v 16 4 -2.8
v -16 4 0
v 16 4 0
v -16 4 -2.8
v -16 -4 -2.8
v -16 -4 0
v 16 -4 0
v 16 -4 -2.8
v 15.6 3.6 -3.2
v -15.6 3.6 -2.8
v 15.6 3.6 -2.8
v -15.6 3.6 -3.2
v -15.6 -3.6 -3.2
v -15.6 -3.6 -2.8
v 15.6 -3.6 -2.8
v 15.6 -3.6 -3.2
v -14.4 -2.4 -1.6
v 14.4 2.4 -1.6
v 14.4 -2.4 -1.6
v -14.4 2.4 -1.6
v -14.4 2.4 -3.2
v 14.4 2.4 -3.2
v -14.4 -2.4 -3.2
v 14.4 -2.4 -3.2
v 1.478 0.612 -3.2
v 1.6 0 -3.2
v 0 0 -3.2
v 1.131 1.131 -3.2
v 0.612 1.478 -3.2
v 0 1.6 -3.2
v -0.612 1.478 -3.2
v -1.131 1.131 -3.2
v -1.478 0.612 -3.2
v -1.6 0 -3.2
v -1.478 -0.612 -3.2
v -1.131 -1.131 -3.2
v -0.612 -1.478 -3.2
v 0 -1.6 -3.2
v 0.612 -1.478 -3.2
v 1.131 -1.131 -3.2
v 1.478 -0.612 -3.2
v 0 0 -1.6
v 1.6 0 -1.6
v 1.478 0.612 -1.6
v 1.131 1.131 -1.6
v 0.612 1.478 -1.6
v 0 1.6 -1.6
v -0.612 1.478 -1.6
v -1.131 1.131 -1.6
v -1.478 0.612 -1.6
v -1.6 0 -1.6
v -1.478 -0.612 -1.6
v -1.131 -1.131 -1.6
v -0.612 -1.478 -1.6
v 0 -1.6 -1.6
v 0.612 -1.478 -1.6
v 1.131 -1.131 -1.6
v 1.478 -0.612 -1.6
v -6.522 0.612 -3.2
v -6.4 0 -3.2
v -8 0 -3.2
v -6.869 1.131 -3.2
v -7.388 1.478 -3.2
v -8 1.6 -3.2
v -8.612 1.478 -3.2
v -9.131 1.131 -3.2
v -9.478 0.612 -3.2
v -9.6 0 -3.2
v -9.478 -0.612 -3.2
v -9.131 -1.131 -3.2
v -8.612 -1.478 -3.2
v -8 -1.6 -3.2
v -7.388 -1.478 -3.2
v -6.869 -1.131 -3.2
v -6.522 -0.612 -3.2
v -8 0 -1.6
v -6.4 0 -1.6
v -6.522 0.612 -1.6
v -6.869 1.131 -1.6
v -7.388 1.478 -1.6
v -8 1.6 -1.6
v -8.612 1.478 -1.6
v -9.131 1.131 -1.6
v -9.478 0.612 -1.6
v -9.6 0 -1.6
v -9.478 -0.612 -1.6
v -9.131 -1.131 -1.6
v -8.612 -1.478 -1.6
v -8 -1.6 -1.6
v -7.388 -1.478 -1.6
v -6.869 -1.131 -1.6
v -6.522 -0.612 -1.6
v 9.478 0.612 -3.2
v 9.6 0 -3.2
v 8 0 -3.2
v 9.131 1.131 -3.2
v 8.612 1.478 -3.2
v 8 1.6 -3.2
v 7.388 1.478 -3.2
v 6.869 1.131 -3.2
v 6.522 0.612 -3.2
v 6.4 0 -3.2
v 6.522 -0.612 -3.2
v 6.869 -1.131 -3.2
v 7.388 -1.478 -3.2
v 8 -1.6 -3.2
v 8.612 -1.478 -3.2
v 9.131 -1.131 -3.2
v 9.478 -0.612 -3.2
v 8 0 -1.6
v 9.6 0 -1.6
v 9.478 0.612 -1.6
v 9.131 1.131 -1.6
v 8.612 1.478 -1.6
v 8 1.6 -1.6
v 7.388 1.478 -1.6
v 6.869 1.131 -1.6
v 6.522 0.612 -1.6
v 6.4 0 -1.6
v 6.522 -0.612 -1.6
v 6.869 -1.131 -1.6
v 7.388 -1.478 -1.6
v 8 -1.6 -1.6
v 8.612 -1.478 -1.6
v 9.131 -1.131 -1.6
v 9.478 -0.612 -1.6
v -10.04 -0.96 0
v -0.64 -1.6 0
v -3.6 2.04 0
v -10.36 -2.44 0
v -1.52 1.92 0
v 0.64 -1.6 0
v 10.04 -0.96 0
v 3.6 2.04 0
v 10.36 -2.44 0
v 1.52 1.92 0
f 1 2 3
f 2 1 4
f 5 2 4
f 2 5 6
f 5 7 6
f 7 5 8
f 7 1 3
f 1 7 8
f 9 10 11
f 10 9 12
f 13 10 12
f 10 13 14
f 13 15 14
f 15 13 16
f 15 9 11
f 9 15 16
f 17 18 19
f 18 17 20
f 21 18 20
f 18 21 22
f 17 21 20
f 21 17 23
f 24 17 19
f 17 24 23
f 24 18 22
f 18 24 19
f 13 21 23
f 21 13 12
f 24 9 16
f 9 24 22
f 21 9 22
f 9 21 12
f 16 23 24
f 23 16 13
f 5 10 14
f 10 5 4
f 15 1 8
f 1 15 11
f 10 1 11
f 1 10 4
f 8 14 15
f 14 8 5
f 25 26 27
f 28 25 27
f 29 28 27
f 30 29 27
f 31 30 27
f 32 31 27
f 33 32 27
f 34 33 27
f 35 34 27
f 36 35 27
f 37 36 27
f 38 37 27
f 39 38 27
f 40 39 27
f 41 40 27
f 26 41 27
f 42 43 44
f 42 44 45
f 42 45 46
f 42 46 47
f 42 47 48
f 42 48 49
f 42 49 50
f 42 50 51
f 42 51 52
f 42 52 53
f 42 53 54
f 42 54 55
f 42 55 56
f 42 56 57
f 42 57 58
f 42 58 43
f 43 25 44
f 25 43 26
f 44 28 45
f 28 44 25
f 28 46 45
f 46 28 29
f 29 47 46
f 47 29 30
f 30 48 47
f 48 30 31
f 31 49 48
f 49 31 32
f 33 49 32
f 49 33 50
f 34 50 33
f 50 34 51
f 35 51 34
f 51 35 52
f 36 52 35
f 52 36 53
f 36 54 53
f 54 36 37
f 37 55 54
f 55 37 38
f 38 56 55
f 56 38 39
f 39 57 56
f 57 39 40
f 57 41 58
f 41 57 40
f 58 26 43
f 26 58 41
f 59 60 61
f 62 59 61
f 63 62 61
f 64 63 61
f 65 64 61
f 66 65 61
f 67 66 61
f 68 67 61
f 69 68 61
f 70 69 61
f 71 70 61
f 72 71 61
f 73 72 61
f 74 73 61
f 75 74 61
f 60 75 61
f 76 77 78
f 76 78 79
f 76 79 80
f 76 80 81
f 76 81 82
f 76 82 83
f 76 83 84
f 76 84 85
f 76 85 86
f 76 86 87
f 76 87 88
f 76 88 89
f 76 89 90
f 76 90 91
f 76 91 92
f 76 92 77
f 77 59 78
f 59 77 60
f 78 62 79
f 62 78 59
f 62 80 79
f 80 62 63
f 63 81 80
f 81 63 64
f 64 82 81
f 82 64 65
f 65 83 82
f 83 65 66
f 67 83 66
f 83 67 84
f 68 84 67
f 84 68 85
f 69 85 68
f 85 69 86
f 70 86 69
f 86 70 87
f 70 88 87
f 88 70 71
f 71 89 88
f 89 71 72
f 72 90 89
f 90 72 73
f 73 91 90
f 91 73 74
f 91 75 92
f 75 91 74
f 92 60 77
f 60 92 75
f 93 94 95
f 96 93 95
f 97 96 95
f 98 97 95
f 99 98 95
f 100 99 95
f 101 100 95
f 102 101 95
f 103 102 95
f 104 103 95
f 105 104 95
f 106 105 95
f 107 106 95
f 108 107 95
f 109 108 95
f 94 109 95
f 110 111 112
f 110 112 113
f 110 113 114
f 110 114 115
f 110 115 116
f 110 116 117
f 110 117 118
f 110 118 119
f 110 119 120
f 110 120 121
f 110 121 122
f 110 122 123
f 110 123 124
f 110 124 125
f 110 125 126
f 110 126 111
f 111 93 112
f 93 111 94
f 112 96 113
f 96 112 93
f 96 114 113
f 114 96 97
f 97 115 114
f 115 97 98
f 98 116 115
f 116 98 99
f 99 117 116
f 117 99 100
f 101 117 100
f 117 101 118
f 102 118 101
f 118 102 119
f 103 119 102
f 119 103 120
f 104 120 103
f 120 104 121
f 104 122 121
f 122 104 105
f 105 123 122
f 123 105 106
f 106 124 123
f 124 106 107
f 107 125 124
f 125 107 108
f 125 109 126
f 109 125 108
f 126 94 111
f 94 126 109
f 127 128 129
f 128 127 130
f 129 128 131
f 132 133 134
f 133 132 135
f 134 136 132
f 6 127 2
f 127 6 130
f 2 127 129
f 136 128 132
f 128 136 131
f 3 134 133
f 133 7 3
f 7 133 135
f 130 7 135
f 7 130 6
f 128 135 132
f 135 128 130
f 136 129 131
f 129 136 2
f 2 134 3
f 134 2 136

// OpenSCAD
// file: ../p/4-4edge.scad
use <../lib.scad>
function ldraw_lib__4_4edge() = [
// 0 Circle 1.0
// 0 Name: 4-4edge.dat
// 0 Author: James Jessiman
// 0 !LDRAW_ORG Primitive UPDATE 2017-01
// 0 !LICENSE Licensed under CC BY 2.0 and CC BY 4.0 : see CAreadme.txt
// 
// 0 BFC CERTIFY CCW
  [0,"BFC","CERTIFY"],
  [0,"BFC","CCW"],
// 
// 0 !HISTORY 1998-12-15 [PTadmin] Official Update 1998-10
// 0 !HISTORY 2005-12-28 [PTadmin] Official Update 2005-01
// 0 !HISTORY 2007-06-24 [PTadmin] Header formatted for Contributor Agreement
// 0 !HISTORY 2008-07-01 [PTadmin] Official Update 2008-01
// 0 !HISTORY 2017-01-15 [Steffen] BFCed
// 0 !HISTORY 2017-12-30 [PTadmin] Official Update 2017-01
// 
// 
// 2 24 1 0 0 0.9239 0 0.3827
  [2,24,1,0,0,0.9239,0,0.3827],
// 2 24 0.9239 0 0.3827 0.7071 0 0.7071
  [2,24,0.9239,0,0.3827,0.7071,0,0.7071],
// 2 24 0.7071 0 0.7071 0.3827 0 0.9239
  [2,24,0.7071,0,0.7071,0.3827,0,0.9239],
// 2 24 0.3827 0 0.9239 0 0 1
  [2,24,0.3827,0,0.9239,0,0,1],
// 2 24 0 0 1 -0.3827 0 0.9239
  [2,24,0,0,1,-0.3827,0,0.9239],
// 2 24 -0.3827 0 0.9239 -0.7071 0 0.7071
  [2,24,-0.3827,0,0.9239,-0.7071,0,0.7071],
// 2 24 -0.7071 0 0.7071 -0.9239 0 0.3827
  [2,24,-0.7071,0,0.7071,-0.9239,0,0.3827],
// 2 24 -0.9239 0 0.3827 -1 0 -0
  [2,24,-0.9239,0,0.3827,-1,0,-0],
// 2 24 -1 0 -0 -0.9239 0 -0.3827
  [2,24,-1,0,-0,-0.9239,0,-0.3827],
// 2 24 -0.9239 0 -0.3827 -0.7071 0 -0.7071
  [2,24,-0.9239,0,-0.3827,-0.7071,0,-0.7071],
// 2 24 -0.7071 0 -0.7071 -0.3827 0 -0.9239
  [2,24,-0.7071,0,-0.7071,-0.3827,0,-0.9239],
// 2 24 -0.3827 0 -0.9239 0 0 -1
  [2,24,-0.3827,0,-0.9239,0,0,-1],
// 2 24 0 0 -1 0.3827 0 -0.9239
  [2,24,0,0,-1,0.3827,0,-0.9239],
// 2 24 0.3827 0 -0.9239 0.7071 0 -0.7071
  [2,24,0.3827,0,-0.9239,0.7071,0,-0.7071],
// 2 24 0.7071 0 -0.7071 0.9239 0 -0.3827
  [2,24,0.7071,0,-0.7071,0.9239,0,-0.3827],
// 2 24 0.9239 0 -0.3827 1 0 0
  [2,24,0.9239,0,-0.3827,1,0,0],
];
module ldraw_lib__4_4edge(step=0, col=false, unit=2/5, alt=false, line=0.2, solid=!$preview)
    makepoly(ldraw_lib__4_4edge(), step=step, col=col, unit=unit, alt=alt, line=line, solid=solid);
ldraw_lib__4_4edge(line=0.2);
// file: ../p/4-4disc.scad
use <../lib.scad>
function ldraw_lib__4_4disc() = [
// 0 Disc 1.0
// 0 Name: 4-4disc.dat
// 0 Author: James Jessiman
// 0 !LDRAW_ORG Primitive UPDATE 2002-02
// 0 !LICENSE Licensed under CC BY 2.0 and CC BY 4.0 : see CAreadme.txt
// 
// 0 BFC CERTIFY CCW
  [0,"BFC","CERTIFY"],
  [0,"BFC","CCW"],
// 
// 0 !HISTORY 1998-12-15 [PTadmin] Official Update 1998-10
// 0 !HISTORY 2002-03-23 [sbliss] Added BFC statement
// 0 !HISTORY 2002-04-25 [PTadmin] Official Update 2002-02
// 0 !HISTORY 2007-06-24 [PTadmin] Header formatted for Contributor Agreement
// 0 !HISTORY 2008-07-01 [PTadmin] Official Update 2008-01
// 
// 
// 3 16 0 0 0 1 0 0 0.9239 0 0.3827
  [3,16,0,0,0,1,0,0,0.9239,0,0.3827],
// 3 16 0 0 0 0.9239 0 0.3827 0.7071 0 0.7071
  [3,16,0,0,0,0.9239,0,0.3827,0.7071,0,0.7071],
// 3 16 0 0 0 0.7071 0 0.7071 0.3827 0 0.9239
  [3,16,0,0,0,0.7071,0,0.7071,0.3827,0,0.9239],
// 3 16 0 0 0 0.3827 0 0.9239 0 0 1
  [3,16,0,0,0,0.3827,0,0.9239,0,0,1],
// 3 16 0 0 0 0 0 1 -0.3827 0 0.9239
  [3,16,0,0,0,0,0,1,-0.3827,0,0.9239],
// 3 16 0 0 0 -0.3827 0 0.9239 -0.7071 0 0.7071
  [3,16,0,0,0,-0.3827,0,0.9239,-0.7071,0,0.7071],
// 3 16 0 0 0 -0.7071 0 0.7071 -0.9239 0 0.3827
  [3,16,0,0,0,-0.7071,0,0.7071,-0.9239,0,0.3827],
// 3 16 0 0 0 -0.9239 0 0.3827 -1 0 -0
  [3,16,0,0,0,-0.9239,0,0.3827,-1,0,-0],
// 3 16 0 0 0 -1 0 -0 -0.9239 0 -0.3827
  [3,16,0,0,0,-1,0,-0,-0.9239,0,-0.3827],
// 3 16 0 0 0 -0.9239 0 -0.3827 -0.7071 0 -0.7071
  [3,16,0,0,0,-0.9239,0,-0.3827,-0.7071,0,-0.7071],
// 3 16 0 0 0 -0.7071 0 -0.7071 -0.3827 0 -0.9239
  [3,16,0,0,0,-0.7071,0,-0.7071,-0.3827,0,-0.9239],
// 3 16 0 0 0 -0.3827 0 -0.9239 0 0 -1
  [3,16,0,0,0,-0.3827,0,-0.9239,0,0,-1],
// 3 16 0 0 0 0 0 -1 0.3827 0 -0.9239
  [3,16,0,0,0,0,0,-1,0.3827,0,-0.9239],
// 3 16 0 0 0 0.3827 0 -0.9239 0.7071 0 -0.7071
  [3,16,0,0,0,0.3827,0,-0.9239,0.7071,0,-0.7071],
// 3 16 0 0 0 0.7071 0 -0.7071 0.9239 0 -0.3827
  [3,16,0,0,0,0.7071,0,-0.7071,0.9239,0,-0.3827],
// 3 16 0 0 0 0.9239 0 -0.3827 1 0 0
  [3,16,0,0,0,0.9239,0,-0.3827,1,0,0],
// 0
];
module ldraw_lib__4_4disc(step=0, col=false, unit=2/5, alt=false, line=0.2, solid=!$preview)
    makepoly(ldraw_lib__4_4disc(), step=step, col=col, unit=unit, alt=alt, line=line, solid=solid);
ldraw_lib__4_4disc(line=0.2);
// file: ../p/4-4cyli.scad
use <../lib.scad>
$fa=1; $fs=0.2;
function ldraw_lib__4_4cyli(realsolid=false) = [
// 0 Cylinder 1.0
// 0 Name: 4-4cyli.dat
// 0 Author: James Jessiman
// 0 !LDRAW_ORG Primitive UPDATE 2005-01
// 0 !LICENSE Licensed under CC BY 2.0 and CC BY 4.0 : see CAreadme.txt
// 
// 0 BFC CERTIFY CCW
  [0,"BFC","CERTIFY"],
  [0,"BFC","CCW"],
// 
// 0 !HISTORY 1998-12-15 [PTadmin] Official Update 1998-10
// 0 !HISTORY 2002-03-23 [sbliss] Added BFC statement; merged headers from files in distributions LDraw 0.27 and Complete.
// 0 !HISTORY 2002-04-25 [PTadmin] Official Update 2002-02
// 0 !HISTORY 2004-12-14 [guyvivan] BFC CCW
// 0 !HISTORY 2005-12-28 [PTadmin] Official Update 2005-01
// 0 !HISTORY 2007-06-24 [PTadmin] Header formatted for Contributor Agreement
// 0 !HISTORY 2008-07-01 [PTadmin] Official Update 2008-01
// 
// 
// 4 16 1 1 0 0.9239 1 0.3827 0.9239 0 0.3827 1 0 0
  [4,16,1,1,0,0.9239,1,0.3827,0.9239,0,0.3827,1,0,0],
// 5 24 1 0 0 1 1 0 0.9239 0 0.3827 0.9239 0 -0.3827
  [5,24,1,0,0,1,1,0,0.9239,0,0.3827,0.9239,0,-0.3827],
// 4 16 0.9239 1 0.3827 0.7071 1 0.7071 0.7071 0 0.7071 0.9239 0 0.3827
  [4,16,0.9239,1,0.3827,0.7071,1,0.7071,0.7071,0,0.7071,0.9239,0,0.3827],
// 5 24 0.9239 0 0.3827 0.9239 1 0.3827 0.7071 0 0.7071 1 0 0
  [5,24,0.9239,0,0.3827,0.9239,1,0.3827,0.7071,0,0.7071,1,0,0],
// 4 16 0.7071 1 0.7071 0.3827 1 0.9239 0.3827 0 0.9239 0.7071 0 0.7071
  [4,16,0.7071,1,0.7071,0.3827,1,0.9239,0.3827,0,0.9239,0.7071,0,0.7071],
// 5 24 0.7071 0 0.7071 0.7071 1 0.7071 0.3827 0 0.9239 0.9239 0 0.3827
  [5,24,0.7071,0,0.7071,0.7071,1,0.7071,0.3827,0,0.9239,0.9239,0,0.3827],
// 4 16 0.3827 1 0.9239 0 1 1 0 0 1 0.3827 0 0.9239
  [4,16,0.3827,1,0.9239,0,1,1,0,0,1,0.3827,0,0.9239],
// 5 24 0.3827 0 0.9239 0.3827 1 0.9239 0 0 1 0.7071 0 0.7071
  [5,24,0.3827,0,0.9239,0.3827,1,0.9239,0,0,1,0.7071,0,0.7071],
// 4 16 0 1 1 -0.3827 1 0.9239 -0.3827 0 0.9239 0 0 1
  [4,16,0,1,1,-0.3827,1,0.9239,-0.3827,0,0.9239,0,0,1],
// 5 24 0 0 1 0 1 1 -0.3827 0 0.9239 0.3827 0 0.9239
  [5,24,0,0,1,0,1,1,-0.3827,0,0.9239,0.3827,0,0.9239],
// 4 16 -0.3827 1 0.9239 -0.7071 1 0.7071 -0.7071 0 0.7071 -0.3827 0 0.9239
  [4,16,-0.3827,1,0.9239,-0.7071,1,0.7071,-0.7071,0,0.7071,-0.3827,0,0.9239],
// 5 24 -0.3827 0 0.9239 -0.3827 1 0.9239 -0.7071 0 0.7071 0 0 1
  [5,24,-0.3827,0,0.9239,-0.3827,1,0.9239,-0.7071,0,0.7071,0,0,1],
// 4 16 -0.7071 1 0.7071 -0.9239 1 0.3827 -0.9239 0 0.3827 -0.7071 0 0.7071
  [4,16,-0.7071,1,0.7071,-0.9239,1,0.3827,-0.9239,0,0.3827,-0.7071,0,0.7071],
// 5 24 -0.7071 0 0.7071 -0.7071 1 0.7071 -0.9239 0 0.3827 -0.3827 0 0.9239
  [5,24,-0.7071,0,0.7071,-0.7071,1,0.7071,-0.9239,0,0.3827,-0.3827,0,0.9239],
// 4 16 -0.9239 1 0.3827 -1 1 0 -1 0 0 -0.9239 0 0.3827
  [4,16,-0.9239,1,0.3827,-1,1,0,-1,0,0,-0.9239,0,0.3827],
// 5 24 -0.9239 0 0.3827 -0.9239 1 0.3827 -1 0 0 -0.7071 0 0.7071
  [5,24,-0.9239,0,0.3827,-0.9239,1,0.3827,-1,0,0,-0.7071,0,0.7071],
// 4 16 -1 1 0 -0.9239 1 -0.3827 -0.9239 0 -0.3827 -1 0 0
  [4,16,-1,1,0,-0.9239,1,-0.3827,-0.9239,0,-0.3827,-1,0,0],
// 5 24 -1 0 0 -1 1 0 -0.9239 0 -0.3827 -0.9239 0 0.3827
  [5,24,-1,0,0,-1,1,0,-0.9239,0,-0.3827,-0.9239,0,0.3827],
// 4 16 -0.9239 1 -0.3827 -0.7071 1 -0.7071 -0.7071 0 -0.7071 -0.9239 0 -0.3827
  [4,16,-0.9239,1,-0.3827,-0.7071,1,-0.7071,-0.7071,0,-0.7071,-0.9239,0,-0.3827],
// 5 24 -0.9239 0 -0.3827 -0.9239 1 -0.3827 -0.7071 0 -0.7071 -1 0 0
  [5,24,-0.9239,0,-0.3827,-0.9239,1,-0.3827,-0.7071,0,-0.7071,-1,0,0],
// 4 16 -0.7071 1 -0.7071 -0.3827 1 -0.9239 -0.3827 0 -0.9239 -0.7071 0 -0.7071
  [4,16,-0.7071,1,-0.7071,-0.3827,1,-0.9239,-0.3827,0,-0.9239,-0.7071,0,-0.7071],
// 5 24 -0.7071 0 -0.7071 -0.7071 1 -0.7071 -0.3827 0 -0.9239 -0.9239 0 -0.3827
  [5,24,-0.7071,0,-0.7071,-0.7071,1,-0.7071,-0.3827,0,-0.9239,-0.9239,0,-0.3827],
// 4 16 -0.3827 1 -0.9239 0 1 -1 0 0 -1 -0.3827 0 -0.9239
  [4,16,-0.3827,1,-0.9239,0,1,-1,0,0,-1,-0.3827,0,-0.9239],
// 5 24 -0.3827 0 -0.9239 -0.3827 1 -0.9239 0 0 -1 -0.7071 0 -0.7071
  [5,24,-0.3827,0,-0.9239,-0.3827,1,-0.9239,0,0,-1,-0.7071,0,-0.7071],
// 4 16 0 1 -1 0.3827 1 -0.9239 0.3827 0 -0.9239 0 0 -1
  [4,16,0,1,-1,0.3827,1,-0.9239,0.3827,0,-0.9239,0,0,-1],
// 5 24 0 0 -1 0 1 -1 0.3827 0 -0.9239 -0.3827 0 -0.9239
  [5,24,0,0,-1,0,1,-1,0.3827,0,-0.9239,-0.3827,0,-0.9239],
// 4 16 0.3827 1 -0.9239 0.7071 1 -0.7071 0.7071 0 -0.7071 0.3827 0 -0.9239
  [4,16,0.3827,1,-0.9239,0.7071,1,-0.7071,0.7071,0,-0.7071,0.3827,0,-0.9239],
// 5 24 0.3827 0 -0.9239 0.3827 1 -0.9239 0.7071 0 -0.7071 0 0 -1
  [5,24,0.3827,0,-0.9239,0.3827,1,-0.9239,0.7071,0,-0.7071,0,0,-1],
// 4 16 0.7071 1 -0.7071 0.9239 1 -0.3827 0.9239 0 -0.3827 0.7071 0 -0.7071
  [4,16,0.7071,1,-0.7071,0.9239,1,-0.3827,0.9239,0,-0.3827,0.7071,0,-0.7071],
// 5 24 0.7071 0 -0.7071 0.7071 1 -0.7071 0.9239 0 -0.3827 0.3827 0 -0.9239
  [5,24,0.7071,0,-0.7071,0.7071,1,-0.7071,0.9239,0,-0.3827,0.3827,0,-0.9239],
// 4 16 0.9239 1 -0.3827 1 1 0 1 0 0 0.9239 0 -0.3827
  [4,16,0.9239,1,-0.3827,1,1,0,1,0,0,0.9239,0,-0.3827],
// 5 24 0.9239 0 -0.3827 0.9239 1 -0.3827 1 0 0 0.7071 0 -0.7071
  [5,24,0.9239,0,-0.3827,0.9239,1,-0.3827,1,0,0,0.7071,0,-0.7071],
// 0
];
module ldraw_lib__4_4cyli(step=0, col=false, unit=2/5, alt=false, line=0.2, solid=!$preview)
    makepoly(ldraw_lib__4_4cyli(solid), step=step, col=col, unit=unit, alt=alt, line=line, solid=solid);
ldraw_lib__4_4cyli(line=0.2);
// file: ../p/stud3.scad
use <../lib.scad>
use <4-4cyli.scad>
use <4-4disc.scad>
use <4-4edge.scad>
function ldraw_lib__stud3() = [
// 0 Stud Tube Solid
// 0 Name: stud3.dat
// 0 Author: James Jessiman
// 0 !LDRAW_ORG Primitive UPDATE 2012-01
// 0 !LICENSE Licensed under CC BY 4.0 : see CAreadme.txt
// 
// 0 BFC CERTIFY CCW
  [0,"BFC","CERTIFY"],
  [0,"BFC","CCW"],
// 
// 0 !HISTORY 2002-04-04 [sbliss] Modified for BFC compliance
// 0 !HISTORY 2002-04-25 [PTadmin] Official Update 2002-02
// 0 !HISTORY 2007-06-24 [PTadmin] Header formatted for Contributor Agreement
// 0 !HISTORY 2008-07-01 [PTadmin] Official Update 2008-01
// 0 !HISTORY 2012-02-16 [Philo] Changed to CCW
// 0 !HISTORY 2012-03-30 [PTadmin] Official Update 2012-01
// 
// 
// 1 16 0 -4 0 4 0 0 0 1 0 0 0 4 4-4edge.dat
  [1,16,0,-4,0,4,0,0,0,1,0,0,0,4, ldraw_lib__4_4edge()],
// 1 16 0 0 0 4 0 0 0 1 0 0 0 4 4-4edge.dat
  [1,16,0,0,0,4,0,0,0,1,0,0,0,4, ldraw_lib__4_4edge()],
// 1 16 0 -4 0 4 0 0 0 1 0 0 0 4 4-4disc.dat
  [1,16,0,-4,0,4,0,0,0,1,0,0,0,4, ldraw_lib__4_4disc()],
  [-1,16,0,0,0,4,0,0,0,-1,0,0,0,4, ldraw_lib__4_4disc()],
// 1 16 0 -4 0 4 0 0 0 4 0 0 0 4 4-4cyli.dat
  [1,16,0,-4,0,4,0,0,0,4,0,0,0,4, ldraw_lib__4_4cyli()],
];
module ldraw_lib__stud3(step=0, col=false, unit=2/5, alt=false, line=0.2, solid=!$preview)
    makepoly(ldraw_lib__stud3(), step=step, col=col, unit=unit, alt=alt, line=line, solid=solid);
ldraw_lib__stud3(line=0.2);
// file: ../p/box5.scad
use <../lib.scad>
function ldraw_lib__box5() = [
// 0 Box with 5 Faces and All Edges
// 0 Name: box5.dat
// 0 Author: James Jessiman
// 0 !LDRAW_ORG Primitive UPDATE 2012-01
// 0 !LICENSE Licensed under CC BY 2.0 and CC BY 4.0 : see CAreadme.txt
// 
// 0 BFC CERTIFY CCW
  [0,"BFC","CERTIFY"],
  [0,"BFC","CCW"],
// 
// 0 !HISTORY 2002-04-03 [sbliss] Modified for BFC compliance
// 0 !HISTORY 2002-04-25 [PTadmin] Official Update 2002-02
// 0 !HISTORY 2007-06-24 [PTadmin] Header formatted for Contributor Agreement
// 0 !HISTORY 2008-07-01 [PTadmin] Official Update 2008-01
// 0 !HISTORY 2012-02-16 [Philo] Changed to CCW
// 0 !HISTORY 2012-03-30 [PTadmin] Official Update 2012-01
// 
// 
// 2 24 1 1 1 -1 1 1
  [2,24,1,1,1,-1,1,1],
// 2 24 -1 1 1 -1 1 -1
  [2,24,-1,1,1,-1,1,-1],
// 2 24 -1 1 -1 1 1 -1
  [2,24,-1,1,-1,1,1,-1],
// 2 24 1 1 -1 1 1 1
  [2,24,1,1,-1,1,1,1],
// 2 24 1 0 1 -1 0 1
  [2,24,1,0,1,-1,0,1],
// 2 24 -1 0 1 -1 0 -1
  [2,24,-1,0,1,-1,0,-1],
// 2 24 -1 0 -1 1 0 -1
  [2,24,-1,0,-1,1,0,-1],
// 2 24 1 0 -1 1 0 1
  [2,24,1,0,-1,1,0,1],
// 2 24 1 0 1 1 1 1
  [2,24,1,0,1,1,1,1],
// 2 24 -1 0 1 -1 1 1
  [2,24,-1,0,1,-1,1,1],
// 2 24 1 0 -1 1 1 -1
  [2,24,1,0,-1,1,1,-1],
// 2 24 -1 0 -1 -1 1 -1
  [2,24,-1,0,-1,-1,1,-1],
// 4 16 -1 1 1 1 1 1 1 1 -1 -1 1 -1
  [4,16,-1,1,1,1,1,1,1,1,-1,-1,1,-1],
// 4 16 -1 1 1 -1 0 1 1 0 1 1 1 1
  [4,16,-1,1,1,-1,0,1,1,0,1,1,1,1],
// 4 16 -1 1 -1 -1 0 -1 -1 0 1 -1 1 1
  [4,16,-1,1,-1,-1,0,-1,-1,0,1,-1,1,1],
// 4 16 1 1 -1 1 0 -1 -1 0 -1 -1 1 -1
  [4,16,1,1,-1,1,0,-1,-1,0,-1,-1,1,-1],
// 4 16 1 1 1 1 0 1 1 0 -1 1 1 -1
  [4,16,1,1,1,1,0,1,1,0,-1,1,1,-1],
];
makepoly(ldraw_lib__box5(), line=0.2);
// file: ../p/box4.scad
use <../lib.scad>
function ldraw_lib__box4() = [
// 0 Box with 4 Faces (2 Parallel Pairs) and All Edges
// 0 Name: box4.dat
// 0 Author: James Jessiman
// 0 !LDRAW_ORG Primitive UPDATE 2012-01
// 0 !LICENSE Licensed under CC BY 4.0 : see CAreadme.txt
// 
// 0 BFC CERTIFY CCW
  [0,"BFC","CERTIFY"],
  [0,"BFC","CCW"],
// 
// 0 !HISTORY 2002-04-03 [sbliss] Modified for BFC compliance
// 0 !HISTORY 2002-04-25 [PTadmin] Official Update 2002-02
// 0 !HISTORY 2007-06-24 [PTadmin] Header formatted for Contributor Agreement
// 0 !HISTORY 2008-07-01 [PTadmin] Official Update 2008-01
// 0 !HISTORY 2012-02-16 [Philo] Changed to CCW
// 0 !HISTORY 2012-03-30 [PTadmin] Official Update 2012-01
// 
// 
// 2 24 1 1 1 -1 1 1
  [2,24,1,1,1,-1,1,1],
// 2 24 -1 1 1 -1 1 -1
  [2,24,-1,1,1,-1,1,-1],
// 2 24 -1 1 -1 1 1 -1
  [2,24,-1,1,-1,1,1,-1],
// 2 24 1 1 -1 1 1 1
  [2,24,1,1,-1,1,1,1],
// 2 24 1 0 1 -1 0 1
  [2,24,1,0,1,-1,0,1],
// 2 24 -1 0 1 -1 0 -1
  [2,24,-1,0,1,-1,0,-1],
// 2 24 -1 0 -1 1 0 -1
  [2,24,-1,0,-1,1,0,-1],
// 2 24 1 0 -1 1 0 1
  [2,24,1,0,-1,1,0,1],
// 2 24 1 0 1 1 1 1
  [2,24,1,0,1,1,1,1],
// 2 24 -1 0 1 -1 1 1
  [2,24,-1,0,1,-1,1,1],
// 2 24 1 0 -1 1 1 -1
  [2,24,1,0,-1,1,1,-1],
// 2 24 -1 0 -1 -1 1 -1
  [2,24,-1,0,-1,-1,1,-1],
// 4 16 -1 1 1 -1 0 1 1 0 1 1 1 1
  [4,16,-1,1,1,-1,0,1,1,0,1,1,1,1],
// 4 16 -1 1 -1 -1 0 -1 -1 0 1 -1 1 1
  [4,16,-1,1,-1,-1,0,-1,-1,0,1,-1,1,1],
// 4 16 1 1 -1 1 0 -1 -1 0 -1 -1 1 -1
  [4,16,1,1,-1,1,0,-1,-1,0,-1,-1,1,-1],
// 4 16 1 1 1 1 0 1 1 0 -1 1 1 -1
  [4,16,1,1,1,1,0,1,1,0,-1,1,1,-1],
];
module ldraw_lib__box4(step=0, col=false, unit=2/5, alt=false, line=0.2, solid=!$preview)
    makepoly(ldraw_lib__box4(), step=step, col=col, unit=unit, alt=alt, line=line, solid=solid);
ldraw_lib__box4(line=0.2);
// file: s/2431s01.scad
use <../../lib.scad>
use <../../p/box4.scad>
use <../../p/box5.scad>
use <../../p/stud3.scad>
function ldraw_lib__s__2431s01() = [
// 0 ~Tile  1 x  4 with Groove without Top Face
// 0 Name: s\2431s01.dat
// 0 Author: Santeri Piippo [arezey]
// 0 !LDRAW_ORG Subpart UPDATE 2010-02
// 0 !LICENSE Licensed under CC BY 2.0 and CC BY 4.0 : see CAreadme.txt
// 
// 0 BFC CERTIFY CCW
  [0,"BFC","CERTIFY"],
  [0,"BFC","CCW"],
// 
// 0 !HISTORY 2010-07-05 [PTadmin] Official Update 2010-02
// 
// 
// 1 16 0 0 0 40 0 0 0 7 0 0 0 10 box4.dat
  [1,16,0,0,0,40,0,0,0,7,0,0,0,10, ldraw_lib__box4()],
// 1 16 0 7 0 39 0 0 0 1 0 0 0 9 box4.dat
  [1,16,0,7,0,39,0,0,0,1,0,0,0,9, ldraw_lib__box4()],
// 0 BFC INVERTNEXT
  [0,"BFC","INVERTNEXT"],
// 1 16 0 8 0 36 0 0 0 -4 0 0 0 6 box5.dat
  [1,16,0,8,0,36,0,0,0,-4,0,0,0,6, ldraw_lib__box5()],
// 4 16 -39 8 9 -36 8 6 -36 8 -6 -39 8 -9
  [4,16,-39,8,9,-36,8,6,-36,8,-6,-39,8,-9],
// 4 16 39 8 -9 36 8 -6 36 8 6 39 8 9
  [4,16,39,8,-9,36,8,-6,36,8,6,39,8,9],
// 4 16 39 8 9 36 8 6 -36 8 6 -39 8 9
  [4,16,39,8,9,36,8,6,-36,8,6,-39,8,9],
// 4 16 -39 8 -9 -36 8 -6 36 8 -6 39 8 -9
  [4,16,-39,8,-9,-36,8,-6,36,8,-6,39,8,-9],
// 4 16 -40 7 10 -39 7 9 -39 7 -9 -40 7 -10
  [4,16,-40,7,10,-39,7,9,-39,7,-9,-40,7,-10],
// 4 16 40 7 -10 39 7 -9 39 7 9 40 7 10
  [4,16,40,7,-10,39,7,-9,39,7,9,40,7,10],
// 4 16 40 7 10 39 7 9 -39 7 9 -40 7 10
  [4,16,40,7,10,39,7,9,-39,7,9,-40,7,10],
// 4 16 -40 7 -10 -39 7 -9 39 7 -9 40 7 -10
  [4,16,-40,7,-10,-39,7,-9,39,7,-9,40,7,-10],
// 1 16 0 4 0 1 0 0 0 -1 0 0 0 1 stud3.dat
  [1,16,0,4,0,1,0,0,0,-1,0,0,0,1, ldraw_lib__stud3()],
// 1 16 -20 4 0 1 0 0 0 -1 0 0 0 1 stud3.dat
  [1,16,-20,4,0,1,0,0,0,-1,0,0,0,1, ldraw_lib__stud3()],
// 1 16 20 4 0 1 0 0 0 -1 0 0 0 1 stud3.dat
  [1,16,20,4,0,1,0,0,0,-1,0,0,0,1, ldraw_lib__stud3()],
// 0 //
];
makepoly(ldraw_lib__s__2431s01(), line=0.2);
// main file
use <../lib.scad>
use <s/2431s01.scad>
function ldraw_lib__2431pzv() = [
// 0 Tile  1 x  4 with Black Pentagonal Shapes Pattern
// 0 Name: 2431pzv.dat
// 0 Author: Evert-Jan Boer [ejboer]
// 0 !LDRAW_ORG Part UPDATE 2023-06
// 0 !LICENSE Licensed under CC BY 4.0 : see CAreadme.txt
// 
// 0 BFC CERTIFY CCW
  [0,"BFC","CERTIFY"],
  [0,"BFC","CCW"],
// 
// 0 !KEYWORDS Bricklink 2431pb832, Lando Calrissian, moustache, Set 40623
// 0 !KEYWORDS Star Wars
// 
// 0 !HISTORY 2023-11-19 [OrionP] Official Update 2023-06
// 
// 
// 1 16 0 0 0 1 0 0 0 1 0 0 0 1 s\2431s01.dat
  [1,16,0,0,0,1,0,0,0,1,0,0,0,1, ldraw_lib__s__2431s01()],
// 
// 4 0 -25.9 0 -6.1 -1.6 0 -4 -9 0 5.1 -25.1 0 -2.4
  [4,0,-25.9,0,-6.1,-1.6,0,-4,-9,0,5.1,-25.1,0,-2.4],
// 3 0 -9.0 0.0 5.1 -1.6 0.0 -4.0 -3.8 0.0 4.8
  [3,0,-9.0,0.0,5.1,-1.6,0.0,-4.0,-3.8,0.0,4.8],
// 4 0 25.9 0 -6.1 25.1 0 -2.4 9 0 5.1 1.6 0 -4
  [4,0,25.9,0,-6.1,25.1,0,-2.4,9,0,5.1,1.6,0,-4],
// 3 0 9.0 0.0 5.1 3.8 0.0 4.8 1.6 0.0 -4.0
  [3,0,9.0,0.0,5.1,3.8,0.0,4.8,1.6,0.0,-4.0],
// 4 16 -40 0 10 -40 0 -10 -25.9 0 -6.1 -25.1 0 -2.4
  [4,16,-40,0,10,-40,0,-10,-25.9,0,-6.1,-25.1,0,-2.4],
// 3 16 -40 0 10 -25.1 0.0 -2.4 -9.0 0.0 5.1
  [3,16,-40,0,10,-25.1,0.0,-2.4,-9.0,0.0,5.1],
// 4 16 -1.6 0 -4 1.6 0 -4 3.8 0 4.8 -3.8 0 4.8
  [4,16,-1.6,0,-4,1.6,0,-4,3.8,0,4.8,-3.8,0,4.8],
// 3 16 40 0 10 9.0 0.0 5.1 25.1 0.0 -2.4
  [3,16,40,0,10,9.0,0.0,5.1,25.1,0.0,-2.4],
// 4 16 25.9 0 -6.1 40 0 -10 40 0 10 25.1 0 -2.4
  [4,16,25.9,0,-6.1,40,0,-10,40,0,10,25.1,0,-2.4],
// 4 16 -40 0 -10 40 0 -10 25.9 0 -6.1 -25.9 0 -6.1
  [4,16,-40,0,-10,40,0,-10,25.9,0,-6.1,-25.9,0,-6.1],
// 4 16 -25.9 0 -6.1 25.9 0 -6.1 1.6 0 -4 -1.6 0 -4
  [4,16,-25.9,0,-6.1,25.9,0,-6.1,1.6,0,-4,-1.6,0,-4],
// 4 16 -9 0 5.1 -3.8 0 4.8 3.8 0 4.8 -40 0 10
  [4,16,-9,0,5.1,-3.8,0,4.8,3.8,0,4.8,-40,0,10],
// 4 16 3.8 0 4.8 9 0 5.1 40 0 10 -40 0 10
  [4,16,3.8,0,4.8,9,0,5.1,40,0,10,-40,0,10],
];
module ldraw_lib__2431pzv(step=0, col=false, unit=2/5, alt=false, line=0.2, solid=!$preview)
    makepoly(ldraw_lib__2431pzv(), step=step, col=col, unit=unit, alt=alt, line=line, solid=solid);
ldraw_lib__2431pzv(line=0.2);
